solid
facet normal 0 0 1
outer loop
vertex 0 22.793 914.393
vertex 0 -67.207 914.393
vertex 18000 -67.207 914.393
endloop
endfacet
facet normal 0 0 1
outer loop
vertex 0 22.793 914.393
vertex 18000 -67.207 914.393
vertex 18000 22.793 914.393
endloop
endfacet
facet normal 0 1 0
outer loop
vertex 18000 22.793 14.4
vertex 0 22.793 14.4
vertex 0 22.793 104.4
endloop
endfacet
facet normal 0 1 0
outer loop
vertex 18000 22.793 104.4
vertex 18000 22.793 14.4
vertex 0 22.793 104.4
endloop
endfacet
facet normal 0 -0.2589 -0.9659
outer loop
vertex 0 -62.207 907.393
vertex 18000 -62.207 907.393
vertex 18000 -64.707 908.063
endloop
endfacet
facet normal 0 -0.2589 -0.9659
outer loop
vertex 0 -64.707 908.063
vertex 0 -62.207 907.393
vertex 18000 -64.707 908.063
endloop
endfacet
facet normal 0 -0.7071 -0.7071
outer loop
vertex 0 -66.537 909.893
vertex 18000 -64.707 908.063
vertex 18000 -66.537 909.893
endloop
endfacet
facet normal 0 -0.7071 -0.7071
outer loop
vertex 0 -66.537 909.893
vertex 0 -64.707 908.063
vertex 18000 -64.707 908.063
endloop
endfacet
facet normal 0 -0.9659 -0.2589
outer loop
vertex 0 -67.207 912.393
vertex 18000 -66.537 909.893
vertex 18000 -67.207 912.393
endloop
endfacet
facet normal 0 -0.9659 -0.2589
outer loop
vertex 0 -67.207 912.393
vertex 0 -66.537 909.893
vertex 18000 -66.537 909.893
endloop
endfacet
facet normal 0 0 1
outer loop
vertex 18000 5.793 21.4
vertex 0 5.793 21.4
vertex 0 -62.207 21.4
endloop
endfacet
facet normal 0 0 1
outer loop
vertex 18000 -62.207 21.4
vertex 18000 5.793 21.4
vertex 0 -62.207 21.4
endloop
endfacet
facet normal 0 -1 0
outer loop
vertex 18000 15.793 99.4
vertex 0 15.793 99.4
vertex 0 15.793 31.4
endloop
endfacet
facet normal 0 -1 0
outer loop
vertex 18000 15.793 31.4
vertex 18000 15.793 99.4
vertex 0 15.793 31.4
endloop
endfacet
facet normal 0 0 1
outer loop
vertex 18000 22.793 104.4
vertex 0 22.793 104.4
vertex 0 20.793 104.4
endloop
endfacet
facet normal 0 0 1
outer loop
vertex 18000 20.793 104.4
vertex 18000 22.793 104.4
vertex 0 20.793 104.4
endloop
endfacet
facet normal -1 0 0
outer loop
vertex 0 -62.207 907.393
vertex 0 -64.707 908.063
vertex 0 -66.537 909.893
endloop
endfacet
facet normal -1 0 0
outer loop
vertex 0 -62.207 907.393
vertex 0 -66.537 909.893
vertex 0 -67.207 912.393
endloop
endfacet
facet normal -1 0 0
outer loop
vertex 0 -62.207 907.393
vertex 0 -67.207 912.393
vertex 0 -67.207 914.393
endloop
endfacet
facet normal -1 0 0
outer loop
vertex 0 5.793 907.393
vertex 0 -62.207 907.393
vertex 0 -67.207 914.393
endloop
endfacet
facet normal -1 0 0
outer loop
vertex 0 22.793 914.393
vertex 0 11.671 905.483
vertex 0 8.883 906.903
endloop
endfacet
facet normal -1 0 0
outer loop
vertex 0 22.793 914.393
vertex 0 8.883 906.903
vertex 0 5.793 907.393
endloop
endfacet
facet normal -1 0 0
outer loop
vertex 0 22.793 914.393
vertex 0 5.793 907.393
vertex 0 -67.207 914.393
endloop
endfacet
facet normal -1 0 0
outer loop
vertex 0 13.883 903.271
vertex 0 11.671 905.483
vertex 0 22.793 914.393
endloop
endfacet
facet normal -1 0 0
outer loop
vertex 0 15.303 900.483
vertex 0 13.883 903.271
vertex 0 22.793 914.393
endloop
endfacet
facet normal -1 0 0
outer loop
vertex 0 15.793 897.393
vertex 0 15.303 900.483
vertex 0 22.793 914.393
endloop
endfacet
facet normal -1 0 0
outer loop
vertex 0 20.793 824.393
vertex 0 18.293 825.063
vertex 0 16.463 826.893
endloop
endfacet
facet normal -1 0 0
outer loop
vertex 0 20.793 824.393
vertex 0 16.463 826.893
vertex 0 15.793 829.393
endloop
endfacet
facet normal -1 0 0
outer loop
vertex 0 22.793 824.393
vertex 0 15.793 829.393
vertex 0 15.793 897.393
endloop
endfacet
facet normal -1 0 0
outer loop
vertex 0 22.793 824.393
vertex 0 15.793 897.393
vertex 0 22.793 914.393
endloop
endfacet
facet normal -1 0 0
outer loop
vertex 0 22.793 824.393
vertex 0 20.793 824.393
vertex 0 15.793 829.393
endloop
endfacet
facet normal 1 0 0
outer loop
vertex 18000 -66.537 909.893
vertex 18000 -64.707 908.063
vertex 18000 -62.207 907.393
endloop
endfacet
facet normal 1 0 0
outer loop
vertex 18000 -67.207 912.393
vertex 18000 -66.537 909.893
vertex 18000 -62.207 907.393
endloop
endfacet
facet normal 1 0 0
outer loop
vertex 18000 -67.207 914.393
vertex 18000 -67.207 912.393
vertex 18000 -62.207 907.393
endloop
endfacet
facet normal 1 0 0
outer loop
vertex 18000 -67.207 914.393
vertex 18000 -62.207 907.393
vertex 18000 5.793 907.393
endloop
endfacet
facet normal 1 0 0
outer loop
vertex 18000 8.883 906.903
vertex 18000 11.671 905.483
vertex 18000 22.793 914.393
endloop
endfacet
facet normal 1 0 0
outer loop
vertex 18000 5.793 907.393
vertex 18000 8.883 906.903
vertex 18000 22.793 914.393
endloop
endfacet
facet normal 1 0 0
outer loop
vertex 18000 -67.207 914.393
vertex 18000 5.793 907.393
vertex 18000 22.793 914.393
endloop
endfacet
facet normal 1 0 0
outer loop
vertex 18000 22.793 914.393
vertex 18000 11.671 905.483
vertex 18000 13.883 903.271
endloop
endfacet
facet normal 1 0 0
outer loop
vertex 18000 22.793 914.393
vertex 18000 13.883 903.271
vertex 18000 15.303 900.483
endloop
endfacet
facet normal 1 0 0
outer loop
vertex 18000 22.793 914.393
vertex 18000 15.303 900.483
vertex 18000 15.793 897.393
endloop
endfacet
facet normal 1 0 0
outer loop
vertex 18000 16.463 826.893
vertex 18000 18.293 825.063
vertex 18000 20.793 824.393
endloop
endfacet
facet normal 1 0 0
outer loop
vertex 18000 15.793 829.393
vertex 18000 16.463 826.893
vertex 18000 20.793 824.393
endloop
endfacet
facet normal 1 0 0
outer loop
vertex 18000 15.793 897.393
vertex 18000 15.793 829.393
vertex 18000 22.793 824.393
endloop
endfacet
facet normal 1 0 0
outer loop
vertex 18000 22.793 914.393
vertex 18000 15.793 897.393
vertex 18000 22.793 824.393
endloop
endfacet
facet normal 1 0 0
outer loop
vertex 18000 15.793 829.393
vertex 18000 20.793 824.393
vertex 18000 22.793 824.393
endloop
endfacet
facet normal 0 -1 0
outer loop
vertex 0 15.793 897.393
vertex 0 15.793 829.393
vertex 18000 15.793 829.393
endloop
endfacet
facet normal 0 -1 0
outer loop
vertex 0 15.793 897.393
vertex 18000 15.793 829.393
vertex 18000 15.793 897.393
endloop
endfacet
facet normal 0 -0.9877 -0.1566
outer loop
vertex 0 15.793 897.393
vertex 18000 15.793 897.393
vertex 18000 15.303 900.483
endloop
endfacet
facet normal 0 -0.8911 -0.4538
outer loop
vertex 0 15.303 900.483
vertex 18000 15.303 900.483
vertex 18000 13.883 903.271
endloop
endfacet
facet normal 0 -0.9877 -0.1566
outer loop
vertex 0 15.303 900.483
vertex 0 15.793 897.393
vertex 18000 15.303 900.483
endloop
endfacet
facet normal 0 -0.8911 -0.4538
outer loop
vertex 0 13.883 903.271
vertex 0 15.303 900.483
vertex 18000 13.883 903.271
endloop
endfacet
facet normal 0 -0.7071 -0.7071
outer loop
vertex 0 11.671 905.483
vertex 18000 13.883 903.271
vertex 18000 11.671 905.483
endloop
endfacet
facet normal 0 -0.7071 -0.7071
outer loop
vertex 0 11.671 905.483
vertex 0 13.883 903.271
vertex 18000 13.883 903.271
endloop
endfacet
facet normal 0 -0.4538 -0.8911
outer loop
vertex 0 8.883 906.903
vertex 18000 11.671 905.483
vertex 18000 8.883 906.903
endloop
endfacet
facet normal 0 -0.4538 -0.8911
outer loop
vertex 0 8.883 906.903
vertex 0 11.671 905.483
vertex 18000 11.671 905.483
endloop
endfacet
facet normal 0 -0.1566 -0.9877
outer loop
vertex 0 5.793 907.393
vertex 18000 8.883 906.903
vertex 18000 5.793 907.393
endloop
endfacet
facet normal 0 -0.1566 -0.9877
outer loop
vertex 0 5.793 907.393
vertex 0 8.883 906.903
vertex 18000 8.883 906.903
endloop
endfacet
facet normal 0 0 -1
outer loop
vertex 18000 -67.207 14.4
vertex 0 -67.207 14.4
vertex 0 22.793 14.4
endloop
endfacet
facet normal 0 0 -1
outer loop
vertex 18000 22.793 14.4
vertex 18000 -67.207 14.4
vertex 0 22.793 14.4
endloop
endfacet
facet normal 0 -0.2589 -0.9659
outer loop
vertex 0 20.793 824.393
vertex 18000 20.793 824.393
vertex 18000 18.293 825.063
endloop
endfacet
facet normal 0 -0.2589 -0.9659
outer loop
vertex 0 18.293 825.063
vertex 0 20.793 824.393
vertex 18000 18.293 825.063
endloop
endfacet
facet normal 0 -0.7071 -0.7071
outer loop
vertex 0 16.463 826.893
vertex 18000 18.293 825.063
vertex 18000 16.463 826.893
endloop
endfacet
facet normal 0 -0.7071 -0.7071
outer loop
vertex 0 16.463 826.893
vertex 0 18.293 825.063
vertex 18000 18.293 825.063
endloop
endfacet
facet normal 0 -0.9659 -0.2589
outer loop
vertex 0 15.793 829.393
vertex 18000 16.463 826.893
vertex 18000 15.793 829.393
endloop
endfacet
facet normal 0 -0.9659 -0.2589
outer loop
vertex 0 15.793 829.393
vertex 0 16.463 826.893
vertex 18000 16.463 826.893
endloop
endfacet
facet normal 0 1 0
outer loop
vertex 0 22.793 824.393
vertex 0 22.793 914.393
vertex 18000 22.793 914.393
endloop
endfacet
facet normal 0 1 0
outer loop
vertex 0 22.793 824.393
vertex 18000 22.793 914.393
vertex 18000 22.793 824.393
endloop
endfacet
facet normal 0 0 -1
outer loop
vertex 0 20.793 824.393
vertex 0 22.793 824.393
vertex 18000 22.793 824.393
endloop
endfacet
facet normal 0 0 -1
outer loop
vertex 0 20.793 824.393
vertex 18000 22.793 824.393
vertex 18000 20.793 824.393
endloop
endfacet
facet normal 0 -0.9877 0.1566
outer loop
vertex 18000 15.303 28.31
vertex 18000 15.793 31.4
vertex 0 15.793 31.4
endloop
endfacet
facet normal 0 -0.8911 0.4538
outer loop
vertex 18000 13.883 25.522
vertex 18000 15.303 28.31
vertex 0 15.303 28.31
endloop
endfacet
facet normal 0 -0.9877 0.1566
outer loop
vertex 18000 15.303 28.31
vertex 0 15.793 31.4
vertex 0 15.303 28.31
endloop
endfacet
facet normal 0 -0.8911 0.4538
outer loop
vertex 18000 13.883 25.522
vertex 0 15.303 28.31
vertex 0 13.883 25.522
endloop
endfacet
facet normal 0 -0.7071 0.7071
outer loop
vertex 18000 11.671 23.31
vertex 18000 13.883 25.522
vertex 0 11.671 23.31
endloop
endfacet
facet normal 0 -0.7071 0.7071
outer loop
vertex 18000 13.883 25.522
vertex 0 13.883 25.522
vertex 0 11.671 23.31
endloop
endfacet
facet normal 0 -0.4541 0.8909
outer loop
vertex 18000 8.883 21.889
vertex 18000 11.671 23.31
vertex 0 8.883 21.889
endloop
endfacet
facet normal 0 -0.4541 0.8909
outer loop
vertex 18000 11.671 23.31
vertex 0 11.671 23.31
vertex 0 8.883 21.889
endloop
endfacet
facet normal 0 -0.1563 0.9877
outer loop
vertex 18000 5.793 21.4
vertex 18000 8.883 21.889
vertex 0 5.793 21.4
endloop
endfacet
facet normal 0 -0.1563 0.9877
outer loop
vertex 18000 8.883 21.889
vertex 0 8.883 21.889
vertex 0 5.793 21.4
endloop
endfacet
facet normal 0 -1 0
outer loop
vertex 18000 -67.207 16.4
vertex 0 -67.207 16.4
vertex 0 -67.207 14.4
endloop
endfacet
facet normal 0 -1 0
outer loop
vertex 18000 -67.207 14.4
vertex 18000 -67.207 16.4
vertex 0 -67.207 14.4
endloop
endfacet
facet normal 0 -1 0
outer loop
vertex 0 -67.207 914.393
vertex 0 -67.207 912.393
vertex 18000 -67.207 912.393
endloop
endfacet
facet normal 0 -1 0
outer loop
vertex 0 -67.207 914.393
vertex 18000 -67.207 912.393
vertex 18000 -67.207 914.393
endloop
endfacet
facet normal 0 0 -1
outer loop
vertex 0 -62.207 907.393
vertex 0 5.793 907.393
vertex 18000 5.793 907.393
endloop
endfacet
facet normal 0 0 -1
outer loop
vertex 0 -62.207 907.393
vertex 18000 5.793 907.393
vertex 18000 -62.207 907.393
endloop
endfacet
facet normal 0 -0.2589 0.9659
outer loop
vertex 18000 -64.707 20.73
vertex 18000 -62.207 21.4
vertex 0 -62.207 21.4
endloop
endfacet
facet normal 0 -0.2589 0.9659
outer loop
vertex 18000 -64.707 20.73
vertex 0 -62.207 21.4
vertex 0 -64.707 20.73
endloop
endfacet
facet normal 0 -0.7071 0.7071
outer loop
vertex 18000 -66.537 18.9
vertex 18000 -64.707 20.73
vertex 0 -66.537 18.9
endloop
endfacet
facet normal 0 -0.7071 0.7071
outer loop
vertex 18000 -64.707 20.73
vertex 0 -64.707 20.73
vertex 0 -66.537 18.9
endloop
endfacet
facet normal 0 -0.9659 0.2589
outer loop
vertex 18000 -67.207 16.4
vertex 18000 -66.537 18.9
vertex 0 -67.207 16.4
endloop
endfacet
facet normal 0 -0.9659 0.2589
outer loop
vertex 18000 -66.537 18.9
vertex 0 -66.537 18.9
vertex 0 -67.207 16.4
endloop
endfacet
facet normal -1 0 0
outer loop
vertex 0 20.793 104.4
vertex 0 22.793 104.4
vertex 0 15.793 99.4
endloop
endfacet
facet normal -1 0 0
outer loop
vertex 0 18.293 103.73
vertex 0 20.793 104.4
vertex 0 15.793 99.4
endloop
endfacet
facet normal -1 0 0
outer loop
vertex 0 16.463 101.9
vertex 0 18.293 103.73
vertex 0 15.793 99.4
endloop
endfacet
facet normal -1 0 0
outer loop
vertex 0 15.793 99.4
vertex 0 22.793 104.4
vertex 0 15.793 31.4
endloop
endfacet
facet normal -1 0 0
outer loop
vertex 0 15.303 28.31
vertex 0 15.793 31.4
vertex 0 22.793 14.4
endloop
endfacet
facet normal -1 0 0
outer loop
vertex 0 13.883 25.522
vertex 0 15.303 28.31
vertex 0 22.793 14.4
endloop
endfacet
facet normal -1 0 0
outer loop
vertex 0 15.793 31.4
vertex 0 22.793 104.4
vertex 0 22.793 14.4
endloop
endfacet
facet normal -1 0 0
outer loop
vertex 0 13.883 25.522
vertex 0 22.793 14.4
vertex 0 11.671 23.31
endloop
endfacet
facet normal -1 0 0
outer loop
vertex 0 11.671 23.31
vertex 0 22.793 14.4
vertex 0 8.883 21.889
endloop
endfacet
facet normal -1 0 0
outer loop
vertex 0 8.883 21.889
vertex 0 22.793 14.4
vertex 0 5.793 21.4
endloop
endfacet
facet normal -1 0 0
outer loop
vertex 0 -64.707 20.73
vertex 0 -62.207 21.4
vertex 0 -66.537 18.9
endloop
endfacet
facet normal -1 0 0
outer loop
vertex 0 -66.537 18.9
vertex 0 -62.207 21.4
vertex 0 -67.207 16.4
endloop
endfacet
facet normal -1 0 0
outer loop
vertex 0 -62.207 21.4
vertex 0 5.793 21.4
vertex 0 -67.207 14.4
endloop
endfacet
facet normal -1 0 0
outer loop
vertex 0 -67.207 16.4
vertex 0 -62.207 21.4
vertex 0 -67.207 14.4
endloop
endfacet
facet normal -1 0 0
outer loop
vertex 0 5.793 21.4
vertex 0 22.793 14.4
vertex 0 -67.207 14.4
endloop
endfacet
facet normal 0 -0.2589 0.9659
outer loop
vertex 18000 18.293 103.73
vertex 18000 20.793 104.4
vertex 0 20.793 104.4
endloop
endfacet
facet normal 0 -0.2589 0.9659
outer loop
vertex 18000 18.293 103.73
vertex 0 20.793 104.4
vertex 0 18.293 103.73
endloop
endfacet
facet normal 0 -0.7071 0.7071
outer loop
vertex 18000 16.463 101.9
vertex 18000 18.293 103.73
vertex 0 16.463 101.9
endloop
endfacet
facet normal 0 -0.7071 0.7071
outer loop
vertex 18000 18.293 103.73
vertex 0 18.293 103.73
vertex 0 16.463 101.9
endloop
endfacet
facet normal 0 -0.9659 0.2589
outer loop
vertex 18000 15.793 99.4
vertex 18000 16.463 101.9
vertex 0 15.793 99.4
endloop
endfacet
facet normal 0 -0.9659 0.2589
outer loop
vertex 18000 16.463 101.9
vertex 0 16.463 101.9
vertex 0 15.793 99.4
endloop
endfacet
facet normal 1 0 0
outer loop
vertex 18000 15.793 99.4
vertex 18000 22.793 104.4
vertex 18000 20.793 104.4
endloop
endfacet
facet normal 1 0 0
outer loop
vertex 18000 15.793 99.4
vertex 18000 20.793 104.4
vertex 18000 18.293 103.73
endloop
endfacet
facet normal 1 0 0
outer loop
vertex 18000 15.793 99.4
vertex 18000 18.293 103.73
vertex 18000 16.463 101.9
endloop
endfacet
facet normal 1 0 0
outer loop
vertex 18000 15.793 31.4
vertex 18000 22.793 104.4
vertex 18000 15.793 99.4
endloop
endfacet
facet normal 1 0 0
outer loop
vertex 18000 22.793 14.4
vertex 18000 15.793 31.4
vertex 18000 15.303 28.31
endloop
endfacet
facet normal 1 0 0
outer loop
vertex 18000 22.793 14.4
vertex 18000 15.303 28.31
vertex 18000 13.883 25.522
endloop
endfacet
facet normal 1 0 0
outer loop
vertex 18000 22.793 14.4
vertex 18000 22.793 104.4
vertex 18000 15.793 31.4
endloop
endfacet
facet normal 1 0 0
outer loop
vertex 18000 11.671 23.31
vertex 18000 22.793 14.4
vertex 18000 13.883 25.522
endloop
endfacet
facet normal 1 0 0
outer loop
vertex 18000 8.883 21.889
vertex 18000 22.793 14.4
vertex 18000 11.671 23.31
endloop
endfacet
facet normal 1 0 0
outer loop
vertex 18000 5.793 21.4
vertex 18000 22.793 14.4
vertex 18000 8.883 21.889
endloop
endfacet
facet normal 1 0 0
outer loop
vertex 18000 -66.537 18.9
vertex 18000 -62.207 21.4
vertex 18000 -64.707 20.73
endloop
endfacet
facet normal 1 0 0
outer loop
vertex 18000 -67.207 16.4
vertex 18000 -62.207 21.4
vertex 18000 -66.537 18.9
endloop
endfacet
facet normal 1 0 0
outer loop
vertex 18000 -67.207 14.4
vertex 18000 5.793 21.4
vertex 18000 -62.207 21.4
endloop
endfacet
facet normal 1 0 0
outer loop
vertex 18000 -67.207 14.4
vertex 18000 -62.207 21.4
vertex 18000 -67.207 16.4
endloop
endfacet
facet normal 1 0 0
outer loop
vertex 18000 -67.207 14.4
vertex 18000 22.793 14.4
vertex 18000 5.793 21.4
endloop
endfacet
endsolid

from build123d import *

# Parameters (mm, degrees)
EXTRUDE017_DEPTH = 18000
EXTRUDE018_DEPTH = 18000


with BuildPart() as extrude017:
    # AngleSteel004 → Extrude017 (new body)
    with BuildSketch(Plane(origin=(0, 53.415282, 39.015282), x_dir=(0, 1, 0), z_dir=(-1, 0, 0))):
        with BuildLine():
            Line((-24.615282, 24.615282), (-24.615282, -65.384718))
            Line((-24.615282, -65.384718), (-22.615282, -65.384718))
            ThreePointArc((-22.615282, -65.384718), (-19.079748, -63.920252), (-17.615282, -60.384718))
            Line((-17.615282, -60.384718), (-17.615282, 7.615282))
            ThreePointArc((-17.615282, 7.615282), (-14.68635, 14.68635), (-7.615282, 17.615282))
            Line((-7.615282, 17.615282), (60.384718, 17.615282))
            ThreePointArc((60.384718, 17.615282), (63.920252, 19.079748), (65.384718, 22.615282))
            Line((65.384718, 22.615282), (65.384718, 24.615282))
            Line((65.384718, 24.615282), (-24.615282, 24.615282))
        make_face()
    extrude(amount=-EXTRUDE017_DEPTH)


with BuildPart() as fusion001:
    # Mirror → Extrude018 (new body)
    with BuildSketch(Plane(origin=(0, 53.415282, 889.777402), x_dir=(0, -1, 0), z_dir=(1, 0, 0))):
        with BuildLine():
            Line((24.615282, -24.615282), (24.615282, 65.384718))
            Line((24.615282, 65.384718), (22.615282, 65.384718))
            ThreePointArc((22.615282, 65.384718), (19.079748, 63.920252), (17.615282, 60.384718))
            Line((17.615282, 60.384718), (17.615282, -7.615282))
            ThreePointArc((17.615282, -7.615282), (14.68635, -14.68635), (7.615282, -17.615282))
            Line((7.615282, -17.615282), (-60.384718, -17.615282))
            ThreePointArc((-60.384718, -17.615282), (-63.920252, -19.079748), (-65.384718, -22.615282))
            Line((-65.384718, -22.615282), (-65.384718, -24.615282))
            Line((-65.384718, -24.615282), (24.615282, -24.615282))
        make_face()
    extrude(amount=EXTRUDE018_DEPTH)

    # Fusion001: union Extrude017
    add(extrude017.part)


with BuildPart() as fusion_mirrored:
    # Mirror001: instance of Fusion001
    add(fusion001.part.mirror(Plane(origin=(0, 28.796342, 514.396342), x_dir=(-1, 0, 0), z_dir=(0, -1, 0))))


with BuildPart() as fusion_mirrored_1:
    # Mirror001 placement: moved
    add(fusion_mirrored.part.moved(Location((0, -6, 0))))


solid = fusion_mirrored_1.part
